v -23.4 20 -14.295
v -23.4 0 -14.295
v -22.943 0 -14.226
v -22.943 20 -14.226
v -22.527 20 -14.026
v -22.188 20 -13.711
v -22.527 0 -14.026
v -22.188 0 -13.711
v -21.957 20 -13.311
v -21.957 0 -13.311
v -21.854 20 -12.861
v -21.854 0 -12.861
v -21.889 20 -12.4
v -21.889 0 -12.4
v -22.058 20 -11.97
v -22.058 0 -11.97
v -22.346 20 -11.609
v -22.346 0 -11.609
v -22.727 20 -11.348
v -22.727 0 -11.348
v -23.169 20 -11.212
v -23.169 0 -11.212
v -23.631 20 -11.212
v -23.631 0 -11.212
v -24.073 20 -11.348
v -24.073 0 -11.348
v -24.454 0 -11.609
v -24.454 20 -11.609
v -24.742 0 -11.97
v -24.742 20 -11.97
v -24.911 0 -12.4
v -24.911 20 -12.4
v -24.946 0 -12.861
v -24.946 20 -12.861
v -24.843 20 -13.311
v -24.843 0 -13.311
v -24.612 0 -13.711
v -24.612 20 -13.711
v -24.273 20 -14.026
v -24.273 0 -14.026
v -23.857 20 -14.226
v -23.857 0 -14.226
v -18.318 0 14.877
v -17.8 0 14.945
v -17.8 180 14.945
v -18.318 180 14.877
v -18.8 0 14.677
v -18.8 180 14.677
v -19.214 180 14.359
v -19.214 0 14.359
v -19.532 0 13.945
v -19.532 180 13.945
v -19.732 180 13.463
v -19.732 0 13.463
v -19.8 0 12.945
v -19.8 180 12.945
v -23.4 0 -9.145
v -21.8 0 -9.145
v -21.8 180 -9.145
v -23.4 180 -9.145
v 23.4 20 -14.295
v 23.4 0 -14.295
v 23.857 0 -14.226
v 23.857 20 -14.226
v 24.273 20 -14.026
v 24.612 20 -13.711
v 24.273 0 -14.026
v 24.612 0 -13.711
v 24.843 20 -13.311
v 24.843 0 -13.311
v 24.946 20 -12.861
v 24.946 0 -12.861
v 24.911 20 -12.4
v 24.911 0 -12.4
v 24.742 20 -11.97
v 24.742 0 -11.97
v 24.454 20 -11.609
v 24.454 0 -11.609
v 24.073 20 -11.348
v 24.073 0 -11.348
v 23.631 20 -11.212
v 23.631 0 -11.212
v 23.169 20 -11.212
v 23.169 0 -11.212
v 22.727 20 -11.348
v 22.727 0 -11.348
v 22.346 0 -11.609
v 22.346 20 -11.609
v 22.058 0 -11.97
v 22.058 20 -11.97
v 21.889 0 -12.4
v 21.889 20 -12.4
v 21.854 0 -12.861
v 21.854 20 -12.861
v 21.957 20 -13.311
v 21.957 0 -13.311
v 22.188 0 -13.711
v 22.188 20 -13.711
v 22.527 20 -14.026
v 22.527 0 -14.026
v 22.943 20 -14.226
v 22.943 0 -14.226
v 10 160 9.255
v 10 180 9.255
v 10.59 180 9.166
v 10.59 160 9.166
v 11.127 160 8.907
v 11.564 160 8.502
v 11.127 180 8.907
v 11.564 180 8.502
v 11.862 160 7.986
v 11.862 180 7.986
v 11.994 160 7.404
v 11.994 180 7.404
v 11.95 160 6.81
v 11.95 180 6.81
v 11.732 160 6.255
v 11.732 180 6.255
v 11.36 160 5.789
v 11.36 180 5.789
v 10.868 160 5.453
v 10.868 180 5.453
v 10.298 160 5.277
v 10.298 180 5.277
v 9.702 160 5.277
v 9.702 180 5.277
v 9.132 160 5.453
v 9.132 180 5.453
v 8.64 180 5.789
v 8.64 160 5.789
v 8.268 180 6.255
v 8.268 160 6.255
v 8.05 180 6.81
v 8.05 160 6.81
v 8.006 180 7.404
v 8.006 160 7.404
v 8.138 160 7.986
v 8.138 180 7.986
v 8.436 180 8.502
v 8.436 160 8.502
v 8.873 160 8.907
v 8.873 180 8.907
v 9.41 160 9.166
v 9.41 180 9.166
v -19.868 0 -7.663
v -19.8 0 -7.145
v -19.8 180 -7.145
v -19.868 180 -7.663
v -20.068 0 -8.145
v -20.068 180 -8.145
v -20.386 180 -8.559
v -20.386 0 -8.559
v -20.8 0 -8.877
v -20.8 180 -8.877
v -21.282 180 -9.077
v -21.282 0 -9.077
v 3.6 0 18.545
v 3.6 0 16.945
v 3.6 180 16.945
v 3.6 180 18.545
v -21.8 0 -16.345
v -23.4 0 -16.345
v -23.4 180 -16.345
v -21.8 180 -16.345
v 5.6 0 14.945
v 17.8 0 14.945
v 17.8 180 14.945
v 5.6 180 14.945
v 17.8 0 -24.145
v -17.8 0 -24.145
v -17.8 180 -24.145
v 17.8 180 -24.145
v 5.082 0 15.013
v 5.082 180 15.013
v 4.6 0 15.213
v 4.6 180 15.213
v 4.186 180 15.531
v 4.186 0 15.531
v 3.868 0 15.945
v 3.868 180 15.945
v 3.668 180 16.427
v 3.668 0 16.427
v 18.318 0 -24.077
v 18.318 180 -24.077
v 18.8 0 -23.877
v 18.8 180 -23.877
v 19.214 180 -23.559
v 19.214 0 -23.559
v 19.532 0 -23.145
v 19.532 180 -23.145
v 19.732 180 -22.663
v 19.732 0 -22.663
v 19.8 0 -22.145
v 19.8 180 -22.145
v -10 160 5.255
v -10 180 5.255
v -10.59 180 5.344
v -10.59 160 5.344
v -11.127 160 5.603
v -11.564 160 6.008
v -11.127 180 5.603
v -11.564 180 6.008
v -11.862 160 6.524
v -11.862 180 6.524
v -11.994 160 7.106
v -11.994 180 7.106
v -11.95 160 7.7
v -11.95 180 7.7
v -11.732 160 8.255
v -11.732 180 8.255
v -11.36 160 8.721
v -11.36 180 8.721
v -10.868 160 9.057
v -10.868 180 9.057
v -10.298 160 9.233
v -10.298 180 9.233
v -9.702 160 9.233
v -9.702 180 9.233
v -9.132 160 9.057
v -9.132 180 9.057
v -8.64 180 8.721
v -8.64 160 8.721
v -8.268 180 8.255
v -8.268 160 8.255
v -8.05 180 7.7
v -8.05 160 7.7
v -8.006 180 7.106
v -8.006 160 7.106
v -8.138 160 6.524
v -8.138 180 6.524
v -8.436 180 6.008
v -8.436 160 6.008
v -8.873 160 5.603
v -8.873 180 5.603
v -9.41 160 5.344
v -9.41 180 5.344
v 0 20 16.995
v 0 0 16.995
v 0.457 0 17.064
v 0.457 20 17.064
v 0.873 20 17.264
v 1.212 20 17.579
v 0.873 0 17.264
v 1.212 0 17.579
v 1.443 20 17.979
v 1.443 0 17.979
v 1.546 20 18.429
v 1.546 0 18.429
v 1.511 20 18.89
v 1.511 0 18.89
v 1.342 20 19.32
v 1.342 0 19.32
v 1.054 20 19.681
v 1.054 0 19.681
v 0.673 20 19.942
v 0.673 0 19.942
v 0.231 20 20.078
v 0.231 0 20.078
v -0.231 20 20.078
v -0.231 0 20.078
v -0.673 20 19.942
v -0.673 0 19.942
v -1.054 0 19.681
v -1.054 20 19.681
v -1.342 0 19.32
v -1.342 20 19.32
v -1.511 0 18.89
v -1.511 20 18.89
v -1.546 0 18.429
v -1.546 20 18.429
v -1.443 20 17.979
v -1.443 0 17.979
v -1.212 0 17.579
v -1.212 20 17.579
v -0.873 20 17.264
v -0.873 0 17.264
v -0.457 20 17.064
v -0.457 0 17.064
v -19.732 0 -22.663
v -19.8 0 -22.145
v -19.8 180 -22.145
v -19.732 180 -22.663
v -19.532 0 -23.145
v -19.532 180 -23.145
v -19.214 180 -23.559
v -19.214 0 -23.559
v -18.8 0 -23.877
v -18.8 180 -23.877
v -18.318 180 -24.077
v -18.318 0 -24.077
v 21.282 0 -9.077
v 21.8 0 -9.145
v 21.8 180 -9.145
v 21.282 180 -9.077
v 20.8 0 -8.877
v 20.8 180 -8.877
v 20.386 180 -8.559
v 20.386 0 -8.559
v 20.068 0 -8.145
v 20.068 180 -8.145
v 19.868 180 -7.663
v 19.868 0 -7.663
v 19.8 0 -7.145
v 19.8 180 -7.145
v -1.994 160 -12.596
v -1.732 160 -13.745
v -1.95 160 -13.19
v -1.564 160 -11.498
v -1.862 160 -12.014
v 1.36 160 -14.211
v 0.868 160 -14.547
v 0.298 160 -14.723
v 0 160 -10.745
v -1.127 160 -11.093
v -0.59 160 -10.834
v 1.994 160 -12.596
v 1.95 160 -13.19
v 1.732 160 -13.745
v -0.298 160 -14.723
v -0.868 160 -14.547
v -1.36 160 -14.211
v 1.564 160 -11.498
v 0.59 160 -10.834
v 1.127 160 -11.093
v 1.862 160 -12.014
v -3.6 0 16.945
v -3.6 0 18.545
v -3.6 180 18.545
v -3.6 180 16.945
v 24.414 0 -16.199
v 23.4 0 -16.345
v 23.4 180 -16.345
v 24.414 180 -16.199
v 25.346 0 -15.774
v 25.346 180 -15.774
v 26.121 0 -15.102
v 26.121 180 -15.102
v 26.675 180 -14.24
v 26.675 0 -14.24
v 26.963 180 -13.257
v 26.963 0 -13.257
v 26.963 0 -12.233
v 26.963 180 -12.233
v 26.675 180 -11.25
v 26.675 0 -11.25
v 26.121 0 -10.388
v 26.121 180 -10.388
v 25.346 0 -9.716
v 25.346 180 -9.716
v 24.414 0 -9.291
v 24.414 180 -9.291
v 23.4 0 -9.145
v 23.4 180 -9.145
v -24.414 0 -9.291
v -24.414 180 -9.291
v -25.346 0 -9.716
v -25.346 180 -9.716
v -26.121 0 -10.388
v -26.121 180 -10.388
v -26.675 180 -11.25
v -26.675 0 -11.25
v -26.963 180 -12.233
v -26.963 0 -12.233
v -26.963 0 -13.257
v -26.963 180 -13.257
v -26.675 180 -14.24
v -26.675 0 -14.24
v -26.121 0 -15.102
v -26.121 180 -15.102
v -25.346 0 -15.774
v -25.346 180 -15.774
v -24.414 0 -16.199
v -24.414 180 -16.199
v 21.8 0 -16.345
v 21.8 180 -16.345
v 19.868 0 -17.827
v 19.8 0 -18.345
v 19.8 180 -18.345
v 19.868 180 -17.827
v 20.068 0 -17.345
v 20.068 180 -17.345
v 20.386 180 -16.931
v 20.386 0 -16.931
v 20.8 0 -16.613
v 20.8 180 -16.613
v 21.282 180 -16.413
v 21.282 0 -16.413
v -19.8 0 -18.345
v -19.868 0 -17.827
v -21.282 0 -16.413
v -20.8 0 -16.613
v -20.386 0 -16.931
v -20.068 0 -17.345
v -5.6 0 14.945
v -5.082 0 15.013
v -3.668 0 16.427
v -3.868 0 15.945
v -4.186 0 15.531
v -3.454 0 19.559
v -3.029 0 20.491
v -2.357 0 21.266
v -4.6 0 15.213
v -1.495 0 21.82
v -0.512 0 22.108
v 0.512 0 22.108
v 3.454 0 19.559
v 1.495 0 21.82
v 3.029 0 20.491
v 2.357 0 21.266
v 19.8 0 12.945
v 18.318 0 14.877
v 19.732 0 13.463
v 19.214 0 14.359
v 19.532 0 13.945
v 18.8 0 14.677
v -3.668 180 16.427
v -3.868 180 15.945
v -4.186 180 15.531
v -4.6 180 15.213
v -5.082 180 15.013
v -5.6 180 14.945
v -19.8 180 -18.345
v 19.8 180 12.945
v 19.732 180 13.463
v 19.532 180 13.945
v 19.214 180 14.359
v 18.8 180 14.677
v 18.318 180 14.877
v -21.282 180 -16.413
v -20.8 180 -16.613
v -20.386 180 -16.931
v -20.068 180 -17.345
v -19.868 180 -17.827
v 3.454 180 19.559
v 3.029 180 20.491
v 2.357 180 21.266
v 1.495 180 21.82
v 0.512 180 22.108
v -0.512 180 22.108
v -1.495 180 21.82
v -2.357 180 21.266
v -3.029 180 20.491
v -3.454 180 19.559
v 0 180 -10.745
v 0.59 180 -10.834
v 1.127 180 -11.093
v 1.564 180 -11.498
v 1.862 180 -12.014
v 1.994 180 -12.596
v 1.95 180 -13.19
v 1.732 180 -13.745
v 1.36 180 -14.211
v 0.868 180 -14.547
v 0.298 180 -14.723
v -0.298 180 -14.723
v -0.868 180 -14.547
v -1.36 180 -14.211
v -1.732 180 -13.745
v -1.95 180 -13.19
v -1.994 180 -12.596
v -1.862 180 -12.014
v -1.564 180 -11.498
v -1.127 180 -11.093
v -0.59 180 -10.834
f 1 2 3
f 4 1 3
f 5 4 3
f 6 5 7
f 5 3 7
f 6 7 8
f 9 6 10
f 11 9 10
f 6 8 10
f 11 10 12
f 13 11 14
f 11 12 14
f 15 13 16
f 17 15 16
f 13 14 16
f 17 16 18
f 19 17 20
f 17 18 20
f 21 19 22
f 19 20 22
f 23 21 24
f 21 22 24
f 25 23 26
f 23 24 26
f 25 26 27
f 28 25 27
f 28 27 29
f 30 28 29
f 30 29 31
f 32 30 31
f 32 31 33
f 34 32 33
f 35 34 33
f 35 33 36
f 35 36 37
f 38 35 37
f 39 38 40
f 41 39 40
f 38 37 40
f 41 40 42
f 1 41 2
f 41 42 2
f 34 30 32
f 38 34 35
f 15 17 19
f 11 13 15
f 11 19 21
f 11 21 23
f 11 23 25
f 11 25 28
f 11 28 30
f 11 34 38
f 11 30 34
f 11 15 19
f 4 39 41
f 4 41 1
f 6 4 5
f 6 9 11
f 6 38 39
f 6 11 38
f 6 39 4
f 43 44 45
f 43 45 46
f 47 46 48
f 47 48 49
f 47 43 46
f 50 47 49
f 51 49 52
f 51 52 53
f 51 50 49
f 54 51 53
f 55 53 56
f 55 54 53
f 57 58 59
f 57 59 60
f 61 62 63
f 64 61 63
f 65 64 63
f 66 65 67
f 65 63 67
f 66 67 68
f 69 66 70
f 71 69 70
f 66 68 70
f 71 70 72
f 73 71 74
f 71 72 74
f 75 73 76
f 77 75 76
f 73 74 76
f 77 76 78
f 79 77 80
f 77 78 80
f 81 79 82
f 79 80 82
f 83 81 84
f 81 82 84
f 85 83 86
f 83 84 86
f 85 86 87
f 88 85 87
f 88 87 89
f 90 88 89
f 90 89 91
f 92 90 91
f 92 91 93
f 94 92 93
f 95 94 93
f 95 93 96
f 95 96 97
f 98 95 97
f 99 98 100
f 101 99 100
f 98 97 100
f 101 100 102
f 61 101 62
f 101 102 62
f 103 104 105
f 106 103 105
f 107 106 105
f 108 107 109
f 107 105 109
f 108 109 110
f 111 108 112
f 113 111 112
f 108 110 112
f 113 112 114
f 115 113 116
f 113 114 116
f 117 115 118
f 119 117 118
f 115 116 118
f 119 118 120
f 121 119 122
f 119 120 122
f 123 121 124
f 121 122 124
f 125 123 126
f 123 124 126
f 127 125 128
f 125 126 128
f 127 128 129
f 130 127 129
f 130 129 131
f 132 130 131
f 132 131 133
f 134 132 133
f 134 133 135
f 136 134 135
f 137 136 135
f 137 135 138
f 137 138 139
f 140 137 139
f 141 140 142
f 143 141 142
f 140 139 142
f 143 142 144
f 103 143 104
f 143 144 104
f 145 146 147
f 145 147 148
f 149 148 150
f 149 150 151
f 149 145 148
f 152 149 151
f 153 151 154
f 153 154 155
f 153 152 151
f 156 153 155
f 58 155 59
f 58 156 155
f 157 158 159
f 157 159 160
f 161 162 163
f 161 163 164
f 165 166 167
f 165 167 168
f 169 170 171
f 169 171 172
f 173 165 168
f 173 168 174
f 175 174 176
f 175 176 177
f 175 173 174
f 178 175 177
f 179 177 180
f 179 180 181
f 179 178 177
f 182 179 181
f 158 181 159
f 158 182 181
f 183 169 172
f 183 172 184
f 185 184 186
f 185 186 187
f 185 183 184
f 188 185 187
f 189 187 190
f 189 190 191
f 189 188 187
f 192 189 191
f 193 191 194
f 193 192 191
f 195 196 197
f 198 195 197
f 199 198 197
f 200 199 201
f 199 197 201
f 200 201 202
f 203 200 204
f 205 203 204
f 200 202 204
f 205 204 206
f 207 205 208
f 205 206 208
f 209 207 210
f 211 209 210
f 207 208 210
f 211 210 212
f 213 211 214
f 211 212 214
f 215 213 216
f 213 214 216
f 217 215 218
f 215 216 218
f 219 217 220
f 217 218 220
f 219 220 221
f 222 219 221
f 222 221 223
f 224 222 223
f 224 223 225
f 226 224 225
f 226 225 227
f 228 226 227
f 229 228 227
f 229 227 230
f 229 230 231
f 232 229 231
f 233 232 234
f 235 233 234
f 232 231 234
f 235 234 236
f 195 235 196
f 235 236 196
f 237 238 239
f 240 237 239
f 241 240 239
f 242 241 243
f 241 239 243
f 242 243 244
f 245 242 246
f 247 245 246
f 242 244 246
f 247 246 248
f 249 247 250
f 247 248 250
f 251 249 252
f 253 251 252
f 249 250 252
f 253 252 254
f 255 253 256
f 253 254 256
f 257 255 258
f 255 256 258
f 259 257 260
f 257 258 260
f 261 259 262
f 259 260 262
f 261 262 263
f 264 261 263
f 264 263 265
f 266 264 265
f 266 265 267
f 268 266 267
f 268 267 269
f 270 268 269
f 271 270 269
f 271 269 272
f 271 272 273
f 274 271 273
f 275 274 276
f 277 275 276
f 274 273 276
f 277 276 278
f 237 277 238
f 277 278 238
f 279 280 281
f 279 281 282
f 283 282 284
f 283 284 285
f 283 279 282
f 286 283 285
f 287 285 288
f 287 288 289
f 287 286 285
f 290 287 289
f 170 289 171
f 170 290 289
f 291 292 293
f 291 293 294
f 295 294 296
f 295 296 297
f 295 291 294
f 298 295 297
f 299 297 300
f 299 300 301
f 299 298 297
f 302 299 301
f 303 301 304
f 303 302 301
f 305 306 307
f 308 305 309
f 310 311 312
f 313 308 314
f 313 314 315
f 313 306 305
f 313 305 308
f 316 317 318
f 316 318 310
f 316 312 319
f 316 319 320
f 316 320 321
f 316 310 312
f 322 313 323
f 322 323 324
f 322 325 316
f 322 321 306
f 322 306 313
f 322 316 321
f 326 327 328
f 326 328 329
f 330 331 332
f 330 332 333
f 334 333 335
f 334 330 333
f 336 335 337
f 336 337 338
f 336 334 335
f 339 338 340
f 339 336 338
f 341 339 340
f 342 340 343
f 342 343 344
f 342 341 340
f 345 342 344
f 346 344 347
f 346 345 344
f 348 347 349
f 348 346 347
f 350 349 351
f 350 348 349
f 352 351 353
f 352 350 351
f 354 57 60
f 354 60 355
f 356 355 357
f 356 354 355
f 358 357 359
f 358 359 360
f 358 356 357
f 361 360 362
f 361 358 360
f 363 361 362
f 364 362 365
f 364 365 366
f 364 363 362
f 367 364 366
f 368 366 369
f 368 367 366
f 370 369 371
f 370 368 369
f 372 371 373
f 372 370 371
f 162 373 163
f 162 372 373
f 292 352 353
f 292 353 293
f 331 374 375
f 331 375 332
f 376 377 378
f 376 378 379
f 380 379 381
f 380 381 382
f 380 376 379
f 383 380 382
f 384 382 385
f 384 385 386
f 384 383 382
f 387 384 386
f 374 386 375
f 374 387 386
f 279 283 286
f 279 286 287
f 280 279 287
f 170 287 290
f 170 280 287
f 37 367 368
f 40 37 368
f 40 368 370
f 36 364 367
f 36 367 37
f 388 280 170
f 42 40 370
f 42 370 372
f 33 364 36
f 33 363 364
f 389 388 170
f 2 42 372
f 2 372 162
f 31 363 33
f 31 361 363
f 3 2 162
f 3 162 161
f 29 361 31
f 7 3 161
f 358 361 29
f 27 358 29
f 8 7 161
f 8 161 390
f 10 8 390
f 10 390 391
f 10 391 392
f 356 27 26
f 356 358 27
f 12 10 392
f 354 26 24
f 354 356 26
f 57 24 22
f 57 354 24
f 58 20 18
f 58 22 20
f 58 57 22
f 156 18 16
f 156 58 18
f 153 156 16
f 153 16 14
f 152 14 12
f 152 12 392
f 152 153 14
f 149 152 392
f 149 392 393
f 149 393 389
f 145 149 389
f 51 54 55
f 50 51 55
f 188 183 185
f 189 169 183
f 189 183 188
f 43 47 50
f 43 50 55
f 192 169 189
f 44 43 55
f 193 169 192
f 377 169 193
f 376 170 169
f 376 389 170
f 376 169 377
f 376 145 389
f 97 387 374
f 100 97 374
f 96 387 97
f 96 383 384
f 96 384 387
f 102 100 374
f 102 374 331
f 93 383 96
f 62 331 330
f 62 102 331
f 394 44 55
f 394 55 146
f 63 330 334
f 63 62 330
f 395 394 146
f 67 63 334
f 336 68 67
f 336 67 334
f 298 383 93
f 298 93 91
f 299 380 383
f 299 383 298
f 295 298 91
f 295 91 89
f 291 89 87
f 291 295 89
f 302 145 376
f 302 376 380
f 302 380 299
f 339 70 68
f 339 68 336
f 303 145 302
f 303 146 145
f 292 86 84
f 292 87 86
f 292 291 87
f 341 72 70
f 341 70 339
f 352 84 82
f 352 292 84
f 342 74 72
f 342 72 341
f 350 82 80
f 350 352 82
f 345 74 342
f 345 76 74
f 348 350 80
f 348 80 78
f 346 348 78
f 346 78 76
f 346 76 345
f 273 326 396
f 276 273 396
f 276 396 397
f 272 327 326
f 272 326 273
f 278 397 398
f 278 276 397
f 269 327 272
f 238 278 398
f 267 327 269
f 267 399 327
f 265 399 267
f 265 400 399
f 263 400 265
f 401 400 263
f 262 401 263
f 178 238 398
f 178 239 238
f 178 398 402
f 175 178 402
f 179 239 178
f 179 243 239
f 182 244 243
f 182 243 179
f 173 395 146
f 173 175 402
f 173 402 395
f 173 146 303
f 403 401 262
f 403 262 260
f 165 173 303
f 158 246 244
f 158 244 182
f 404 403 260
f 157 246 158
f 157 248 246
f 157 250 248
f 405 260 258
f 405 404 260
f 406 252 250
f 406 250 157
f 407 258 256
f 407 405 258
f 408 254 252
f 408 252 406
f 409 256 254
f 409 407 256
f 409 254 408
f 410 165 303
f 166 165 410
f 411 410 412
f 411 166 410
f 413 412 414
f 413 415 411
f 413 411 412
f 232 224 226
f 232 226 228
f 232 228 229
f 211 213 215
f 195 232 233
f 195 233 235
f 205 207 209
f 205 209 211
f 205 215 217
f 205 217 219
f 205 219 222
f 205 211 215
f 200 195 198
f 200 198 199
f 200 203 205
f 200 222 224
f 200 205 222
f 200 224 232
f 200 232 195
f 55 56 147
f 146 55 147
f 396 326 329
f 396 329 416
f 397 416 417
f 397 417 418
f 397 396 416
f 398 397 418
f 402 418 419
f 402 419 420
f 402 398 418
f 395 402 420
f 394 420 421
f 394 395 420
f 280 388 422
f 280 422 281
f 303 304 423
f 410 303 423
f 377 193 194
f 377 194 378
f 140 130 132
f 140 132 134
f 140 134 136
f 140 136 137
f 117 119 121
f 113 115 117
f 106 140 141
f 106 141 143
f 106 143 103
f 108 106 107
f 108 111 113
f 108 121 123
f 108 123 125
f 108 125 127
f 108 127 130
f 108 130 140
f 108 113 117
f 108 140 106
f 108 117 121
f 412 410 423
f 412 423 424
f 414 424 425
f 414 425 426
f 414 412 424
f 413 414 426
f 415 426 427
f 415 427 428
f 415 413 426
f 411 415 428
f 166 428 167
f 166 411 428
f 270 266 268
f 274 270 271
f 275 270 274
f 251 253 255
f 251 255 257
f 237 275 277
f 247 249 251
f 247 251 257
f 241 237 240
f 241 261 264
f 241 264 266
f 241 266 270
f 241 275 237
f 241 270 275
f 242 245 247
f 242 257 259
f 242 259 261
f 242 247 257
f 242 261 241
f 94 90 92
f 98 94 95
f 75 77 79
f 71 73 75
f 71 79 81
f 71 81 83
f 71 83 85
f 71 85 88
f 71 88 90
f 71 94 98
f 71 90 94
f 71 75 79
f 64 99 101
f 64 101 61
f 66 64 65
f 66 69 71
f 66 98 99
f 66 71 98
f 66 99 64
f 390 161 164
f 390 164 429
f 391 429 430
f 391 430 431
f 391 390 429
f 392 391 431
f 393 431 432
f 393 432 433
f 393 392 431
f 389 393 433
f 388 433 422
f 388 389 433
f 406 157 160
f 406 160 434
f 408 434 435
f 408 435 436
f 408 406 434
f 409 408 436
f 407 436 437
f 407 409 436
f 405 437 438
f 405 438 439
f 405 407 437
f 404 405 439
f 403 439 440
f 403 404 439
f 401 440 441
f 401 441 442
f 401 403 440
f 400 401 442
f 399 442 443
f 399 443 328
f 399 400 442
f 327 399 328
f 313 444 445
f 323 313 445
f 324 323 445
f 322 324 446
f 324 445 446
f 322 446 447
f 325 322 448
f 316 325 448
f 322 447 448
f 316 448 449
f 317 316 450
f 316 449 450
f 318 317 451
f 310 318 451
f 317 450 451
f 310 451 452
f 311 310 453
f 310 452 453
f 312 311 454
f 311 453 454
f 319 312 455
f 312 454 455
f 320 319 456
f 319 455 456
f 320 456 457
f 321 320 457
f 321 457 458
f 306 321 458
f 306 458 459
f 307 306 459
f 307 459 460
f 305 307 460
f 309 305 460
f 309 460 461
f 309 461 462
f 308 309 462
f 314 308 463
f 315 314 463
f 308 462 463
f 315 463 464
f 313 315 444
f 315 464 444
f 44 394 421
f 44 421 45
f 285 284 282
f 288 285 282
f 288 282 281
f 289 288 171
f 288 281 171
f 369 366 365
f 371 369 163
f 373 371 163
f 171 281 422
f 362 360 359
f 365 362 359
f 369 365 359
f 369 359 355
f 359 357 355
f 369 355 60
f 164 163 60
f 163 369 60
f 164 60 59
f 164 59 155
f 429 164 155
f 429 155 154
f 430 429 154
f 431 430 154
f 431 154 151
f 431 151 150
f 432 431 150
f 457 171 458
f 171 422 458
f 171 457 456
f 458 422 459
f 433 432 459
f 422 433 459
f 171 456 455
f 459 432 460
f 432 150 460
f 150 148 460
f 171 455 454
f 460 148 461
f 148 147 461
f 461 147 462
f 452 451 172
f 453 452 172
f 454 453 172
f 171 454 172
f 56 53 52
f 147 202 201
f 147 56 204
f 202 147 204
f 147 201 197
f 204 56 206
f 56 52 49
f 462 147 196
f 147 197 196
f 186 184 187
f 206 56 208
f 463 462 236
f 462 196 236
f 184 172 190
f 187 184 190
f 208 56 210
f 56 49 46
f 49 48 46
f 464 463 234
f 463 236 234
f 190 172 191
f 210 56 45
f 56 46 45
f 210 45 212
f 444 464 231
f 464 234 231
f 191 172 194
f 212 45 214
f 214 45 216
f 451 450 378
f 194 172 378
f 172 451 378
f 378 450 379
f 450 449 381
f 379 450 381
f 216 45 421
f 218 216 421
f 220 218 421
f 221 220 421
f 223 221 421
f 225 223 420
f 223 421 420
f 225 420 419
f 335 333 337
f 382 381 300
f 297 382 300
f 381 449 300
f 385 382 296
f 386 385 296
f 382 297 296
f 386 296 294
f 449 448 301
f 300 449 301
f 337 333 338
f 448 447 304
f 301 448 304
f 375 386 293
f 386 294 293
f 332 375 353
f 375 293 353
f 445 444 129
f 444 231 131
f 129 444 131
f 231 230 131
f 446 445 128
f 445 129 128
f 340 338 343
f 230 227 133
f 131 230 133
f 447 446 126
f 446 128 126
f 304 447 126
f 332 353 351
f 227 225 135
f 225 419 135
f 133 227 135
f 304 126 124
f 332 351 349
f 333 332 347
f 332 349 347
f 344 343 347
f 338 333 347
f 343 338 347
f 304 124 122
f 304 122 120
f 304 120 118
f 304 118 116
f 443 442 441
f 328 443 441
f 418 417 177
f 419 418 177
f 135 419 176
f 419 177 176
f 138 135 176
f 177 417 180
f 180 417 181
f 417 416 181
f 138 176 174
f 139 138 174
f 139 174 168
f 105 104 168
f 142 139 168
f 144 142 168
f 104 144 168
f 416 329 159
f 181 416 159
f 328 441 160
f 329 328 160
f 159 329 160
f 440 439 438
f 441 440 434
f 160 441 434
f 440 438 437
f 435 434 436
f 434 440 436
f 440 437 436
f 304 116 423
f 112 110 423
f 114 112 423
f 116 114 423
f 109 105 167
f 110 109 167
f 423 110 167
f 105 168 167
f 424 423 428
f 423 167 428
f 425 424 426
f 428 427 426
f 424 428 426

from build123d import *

# Parameters (mm, degrees)
BOSS_EXTRUDE1_DEPTH = 180
SKETCH12_R          = 1.55
CUT_EXTRUDE1_DEPTH  = 20
SKETCH13_R          = 2
CUT_EXTRUDE2_DEPTH  = 20


with BuildPart() as part:
    # Sketch1 → Boss-Extrude1 (new body)
    with BuildSketch(Plane.XZ):
        with BuildLine():
            Line((-17.8, -24.145), (-3.6, -24.145))
            Line((-3.6, -24.145), (3.6, -24.145))
            Line((3.6, -24.145), (17.8, -24.145))
            ThreePointArc((17.8, -24.145), (19.214213562, -23.559213562), (19.8, -22.145))
            Line((19.8, -22.145), (19.8, -18.345))
            ThreePointArc((19.8, -18.345), (20.385786438, -16.930786438), (21.8, -16.345))
            Line((21.8, -16.345), (23.4, -16.345))
            ThreePointArc((23.4, -16.345), (27, -12.745), (23.4, -9.145))
            Line((23.4, -9.145), (21.8, -9.145))
            ThreePointArc((21.8, -9.145), (20.385786438, -8.559213562), (19.8, -7.145))
            Line((19.8, -7.145), (19.8, 12.945))
            ThreePointArc((19.8, 12.945), (19.214213562, 14.359213562), (17.8, 14.945))
            Line((17.8, 14.945), (5.6, 14.945))
            ThreePointArc((5.6, 14.945), (4.185786438, 15.530786438), (3.6, 16.945))
            Line((3.6, 16.945), (3.6, 18.545))
            ThreePointArc((3.6, 18.545), (0, 22.145), (-3.6, 18.545))
            Line((-3.6, 18.545), (-3.6, 16.945))
            ThreePointArc((-3.6, 16.945), (-4.185786438, 15.530786438), (-5.6, 14.945))
            Line((-5.6, 14.945), (-17.8, 14.945))
            ThreePointArc((-17.8, 14.945), (-19.214213562, 14.359213562), (-19.8, 12.945))
            Line((-19.8, 12.945), (-19.8, -7.145))
            ThreePointArc((-19.8, -7.145), (-20.385786438, -8.559213562), (-21.8, -9.145))
            Line((-21.8, -9.145), (-23.4, -9.145))
            ThreePointArc((-23.4, -9.145), (-27, -12.745), (-23.4, -16.345))
            Line((-23.4, -16.345), (-21.8, -16.345))
            ThreePointArc((-21.8, -16.345), (-20.385786438, -16.930786438), (-19.8, -18.345))
            Line((-19.8, -18.345), (-19.8, -22.145))
            ThreePointArc((-19.8, -22.145), (-19.214213562, -23.559213562), (-17.8, -24.145))
        make_face()
    extrude(amount=-BOSS_EXTRUDE1_DEPTH)

    # Sketch12 → Cut-Extrude1 (cut)
    with BuildSketch(Plane.XZ):
        with Locations(Location((0, 18.545, 0), (0, 0, 270))):
            Circle(SKETCH12_R)
        with Locations(Location((-23.4, -12.745, 0), (0, 0, 270))):
            Circle(SKETCH12_R)
        with Locations(Location((23.4, -12.745, 0), (0, 0, 270))):
            Circle(SKETCH12_R)
    extrude(amount=-CUT_EXTRUDE1_DEPTH, mode=Mode.SUBTRACT)

    # Sketch13 → Cut-Extrude2 (cut)
    with BuildSketch(Plane(origin=(0, 180, 0), x_dir=(1, 0, 0), z_dir=(0, 1, 0))):
        with Locations(Location((0, 12.745, 0), (0, 0, 270))):
            Circle(SKETCH13_R)
        with Locations(Location((10, -7.255, 0), (0, 0, 270))):
            Circle(SKETCH13_R)
        with Locations(Location((-10, -7.255, 0), (0, 0, 90))):
            Circle(SKETCH13_R)
    extrude(amount=-CUT_EXTRUDE2_DEPTH, mode=Mode.SUBTRACT)


solid = part.part
